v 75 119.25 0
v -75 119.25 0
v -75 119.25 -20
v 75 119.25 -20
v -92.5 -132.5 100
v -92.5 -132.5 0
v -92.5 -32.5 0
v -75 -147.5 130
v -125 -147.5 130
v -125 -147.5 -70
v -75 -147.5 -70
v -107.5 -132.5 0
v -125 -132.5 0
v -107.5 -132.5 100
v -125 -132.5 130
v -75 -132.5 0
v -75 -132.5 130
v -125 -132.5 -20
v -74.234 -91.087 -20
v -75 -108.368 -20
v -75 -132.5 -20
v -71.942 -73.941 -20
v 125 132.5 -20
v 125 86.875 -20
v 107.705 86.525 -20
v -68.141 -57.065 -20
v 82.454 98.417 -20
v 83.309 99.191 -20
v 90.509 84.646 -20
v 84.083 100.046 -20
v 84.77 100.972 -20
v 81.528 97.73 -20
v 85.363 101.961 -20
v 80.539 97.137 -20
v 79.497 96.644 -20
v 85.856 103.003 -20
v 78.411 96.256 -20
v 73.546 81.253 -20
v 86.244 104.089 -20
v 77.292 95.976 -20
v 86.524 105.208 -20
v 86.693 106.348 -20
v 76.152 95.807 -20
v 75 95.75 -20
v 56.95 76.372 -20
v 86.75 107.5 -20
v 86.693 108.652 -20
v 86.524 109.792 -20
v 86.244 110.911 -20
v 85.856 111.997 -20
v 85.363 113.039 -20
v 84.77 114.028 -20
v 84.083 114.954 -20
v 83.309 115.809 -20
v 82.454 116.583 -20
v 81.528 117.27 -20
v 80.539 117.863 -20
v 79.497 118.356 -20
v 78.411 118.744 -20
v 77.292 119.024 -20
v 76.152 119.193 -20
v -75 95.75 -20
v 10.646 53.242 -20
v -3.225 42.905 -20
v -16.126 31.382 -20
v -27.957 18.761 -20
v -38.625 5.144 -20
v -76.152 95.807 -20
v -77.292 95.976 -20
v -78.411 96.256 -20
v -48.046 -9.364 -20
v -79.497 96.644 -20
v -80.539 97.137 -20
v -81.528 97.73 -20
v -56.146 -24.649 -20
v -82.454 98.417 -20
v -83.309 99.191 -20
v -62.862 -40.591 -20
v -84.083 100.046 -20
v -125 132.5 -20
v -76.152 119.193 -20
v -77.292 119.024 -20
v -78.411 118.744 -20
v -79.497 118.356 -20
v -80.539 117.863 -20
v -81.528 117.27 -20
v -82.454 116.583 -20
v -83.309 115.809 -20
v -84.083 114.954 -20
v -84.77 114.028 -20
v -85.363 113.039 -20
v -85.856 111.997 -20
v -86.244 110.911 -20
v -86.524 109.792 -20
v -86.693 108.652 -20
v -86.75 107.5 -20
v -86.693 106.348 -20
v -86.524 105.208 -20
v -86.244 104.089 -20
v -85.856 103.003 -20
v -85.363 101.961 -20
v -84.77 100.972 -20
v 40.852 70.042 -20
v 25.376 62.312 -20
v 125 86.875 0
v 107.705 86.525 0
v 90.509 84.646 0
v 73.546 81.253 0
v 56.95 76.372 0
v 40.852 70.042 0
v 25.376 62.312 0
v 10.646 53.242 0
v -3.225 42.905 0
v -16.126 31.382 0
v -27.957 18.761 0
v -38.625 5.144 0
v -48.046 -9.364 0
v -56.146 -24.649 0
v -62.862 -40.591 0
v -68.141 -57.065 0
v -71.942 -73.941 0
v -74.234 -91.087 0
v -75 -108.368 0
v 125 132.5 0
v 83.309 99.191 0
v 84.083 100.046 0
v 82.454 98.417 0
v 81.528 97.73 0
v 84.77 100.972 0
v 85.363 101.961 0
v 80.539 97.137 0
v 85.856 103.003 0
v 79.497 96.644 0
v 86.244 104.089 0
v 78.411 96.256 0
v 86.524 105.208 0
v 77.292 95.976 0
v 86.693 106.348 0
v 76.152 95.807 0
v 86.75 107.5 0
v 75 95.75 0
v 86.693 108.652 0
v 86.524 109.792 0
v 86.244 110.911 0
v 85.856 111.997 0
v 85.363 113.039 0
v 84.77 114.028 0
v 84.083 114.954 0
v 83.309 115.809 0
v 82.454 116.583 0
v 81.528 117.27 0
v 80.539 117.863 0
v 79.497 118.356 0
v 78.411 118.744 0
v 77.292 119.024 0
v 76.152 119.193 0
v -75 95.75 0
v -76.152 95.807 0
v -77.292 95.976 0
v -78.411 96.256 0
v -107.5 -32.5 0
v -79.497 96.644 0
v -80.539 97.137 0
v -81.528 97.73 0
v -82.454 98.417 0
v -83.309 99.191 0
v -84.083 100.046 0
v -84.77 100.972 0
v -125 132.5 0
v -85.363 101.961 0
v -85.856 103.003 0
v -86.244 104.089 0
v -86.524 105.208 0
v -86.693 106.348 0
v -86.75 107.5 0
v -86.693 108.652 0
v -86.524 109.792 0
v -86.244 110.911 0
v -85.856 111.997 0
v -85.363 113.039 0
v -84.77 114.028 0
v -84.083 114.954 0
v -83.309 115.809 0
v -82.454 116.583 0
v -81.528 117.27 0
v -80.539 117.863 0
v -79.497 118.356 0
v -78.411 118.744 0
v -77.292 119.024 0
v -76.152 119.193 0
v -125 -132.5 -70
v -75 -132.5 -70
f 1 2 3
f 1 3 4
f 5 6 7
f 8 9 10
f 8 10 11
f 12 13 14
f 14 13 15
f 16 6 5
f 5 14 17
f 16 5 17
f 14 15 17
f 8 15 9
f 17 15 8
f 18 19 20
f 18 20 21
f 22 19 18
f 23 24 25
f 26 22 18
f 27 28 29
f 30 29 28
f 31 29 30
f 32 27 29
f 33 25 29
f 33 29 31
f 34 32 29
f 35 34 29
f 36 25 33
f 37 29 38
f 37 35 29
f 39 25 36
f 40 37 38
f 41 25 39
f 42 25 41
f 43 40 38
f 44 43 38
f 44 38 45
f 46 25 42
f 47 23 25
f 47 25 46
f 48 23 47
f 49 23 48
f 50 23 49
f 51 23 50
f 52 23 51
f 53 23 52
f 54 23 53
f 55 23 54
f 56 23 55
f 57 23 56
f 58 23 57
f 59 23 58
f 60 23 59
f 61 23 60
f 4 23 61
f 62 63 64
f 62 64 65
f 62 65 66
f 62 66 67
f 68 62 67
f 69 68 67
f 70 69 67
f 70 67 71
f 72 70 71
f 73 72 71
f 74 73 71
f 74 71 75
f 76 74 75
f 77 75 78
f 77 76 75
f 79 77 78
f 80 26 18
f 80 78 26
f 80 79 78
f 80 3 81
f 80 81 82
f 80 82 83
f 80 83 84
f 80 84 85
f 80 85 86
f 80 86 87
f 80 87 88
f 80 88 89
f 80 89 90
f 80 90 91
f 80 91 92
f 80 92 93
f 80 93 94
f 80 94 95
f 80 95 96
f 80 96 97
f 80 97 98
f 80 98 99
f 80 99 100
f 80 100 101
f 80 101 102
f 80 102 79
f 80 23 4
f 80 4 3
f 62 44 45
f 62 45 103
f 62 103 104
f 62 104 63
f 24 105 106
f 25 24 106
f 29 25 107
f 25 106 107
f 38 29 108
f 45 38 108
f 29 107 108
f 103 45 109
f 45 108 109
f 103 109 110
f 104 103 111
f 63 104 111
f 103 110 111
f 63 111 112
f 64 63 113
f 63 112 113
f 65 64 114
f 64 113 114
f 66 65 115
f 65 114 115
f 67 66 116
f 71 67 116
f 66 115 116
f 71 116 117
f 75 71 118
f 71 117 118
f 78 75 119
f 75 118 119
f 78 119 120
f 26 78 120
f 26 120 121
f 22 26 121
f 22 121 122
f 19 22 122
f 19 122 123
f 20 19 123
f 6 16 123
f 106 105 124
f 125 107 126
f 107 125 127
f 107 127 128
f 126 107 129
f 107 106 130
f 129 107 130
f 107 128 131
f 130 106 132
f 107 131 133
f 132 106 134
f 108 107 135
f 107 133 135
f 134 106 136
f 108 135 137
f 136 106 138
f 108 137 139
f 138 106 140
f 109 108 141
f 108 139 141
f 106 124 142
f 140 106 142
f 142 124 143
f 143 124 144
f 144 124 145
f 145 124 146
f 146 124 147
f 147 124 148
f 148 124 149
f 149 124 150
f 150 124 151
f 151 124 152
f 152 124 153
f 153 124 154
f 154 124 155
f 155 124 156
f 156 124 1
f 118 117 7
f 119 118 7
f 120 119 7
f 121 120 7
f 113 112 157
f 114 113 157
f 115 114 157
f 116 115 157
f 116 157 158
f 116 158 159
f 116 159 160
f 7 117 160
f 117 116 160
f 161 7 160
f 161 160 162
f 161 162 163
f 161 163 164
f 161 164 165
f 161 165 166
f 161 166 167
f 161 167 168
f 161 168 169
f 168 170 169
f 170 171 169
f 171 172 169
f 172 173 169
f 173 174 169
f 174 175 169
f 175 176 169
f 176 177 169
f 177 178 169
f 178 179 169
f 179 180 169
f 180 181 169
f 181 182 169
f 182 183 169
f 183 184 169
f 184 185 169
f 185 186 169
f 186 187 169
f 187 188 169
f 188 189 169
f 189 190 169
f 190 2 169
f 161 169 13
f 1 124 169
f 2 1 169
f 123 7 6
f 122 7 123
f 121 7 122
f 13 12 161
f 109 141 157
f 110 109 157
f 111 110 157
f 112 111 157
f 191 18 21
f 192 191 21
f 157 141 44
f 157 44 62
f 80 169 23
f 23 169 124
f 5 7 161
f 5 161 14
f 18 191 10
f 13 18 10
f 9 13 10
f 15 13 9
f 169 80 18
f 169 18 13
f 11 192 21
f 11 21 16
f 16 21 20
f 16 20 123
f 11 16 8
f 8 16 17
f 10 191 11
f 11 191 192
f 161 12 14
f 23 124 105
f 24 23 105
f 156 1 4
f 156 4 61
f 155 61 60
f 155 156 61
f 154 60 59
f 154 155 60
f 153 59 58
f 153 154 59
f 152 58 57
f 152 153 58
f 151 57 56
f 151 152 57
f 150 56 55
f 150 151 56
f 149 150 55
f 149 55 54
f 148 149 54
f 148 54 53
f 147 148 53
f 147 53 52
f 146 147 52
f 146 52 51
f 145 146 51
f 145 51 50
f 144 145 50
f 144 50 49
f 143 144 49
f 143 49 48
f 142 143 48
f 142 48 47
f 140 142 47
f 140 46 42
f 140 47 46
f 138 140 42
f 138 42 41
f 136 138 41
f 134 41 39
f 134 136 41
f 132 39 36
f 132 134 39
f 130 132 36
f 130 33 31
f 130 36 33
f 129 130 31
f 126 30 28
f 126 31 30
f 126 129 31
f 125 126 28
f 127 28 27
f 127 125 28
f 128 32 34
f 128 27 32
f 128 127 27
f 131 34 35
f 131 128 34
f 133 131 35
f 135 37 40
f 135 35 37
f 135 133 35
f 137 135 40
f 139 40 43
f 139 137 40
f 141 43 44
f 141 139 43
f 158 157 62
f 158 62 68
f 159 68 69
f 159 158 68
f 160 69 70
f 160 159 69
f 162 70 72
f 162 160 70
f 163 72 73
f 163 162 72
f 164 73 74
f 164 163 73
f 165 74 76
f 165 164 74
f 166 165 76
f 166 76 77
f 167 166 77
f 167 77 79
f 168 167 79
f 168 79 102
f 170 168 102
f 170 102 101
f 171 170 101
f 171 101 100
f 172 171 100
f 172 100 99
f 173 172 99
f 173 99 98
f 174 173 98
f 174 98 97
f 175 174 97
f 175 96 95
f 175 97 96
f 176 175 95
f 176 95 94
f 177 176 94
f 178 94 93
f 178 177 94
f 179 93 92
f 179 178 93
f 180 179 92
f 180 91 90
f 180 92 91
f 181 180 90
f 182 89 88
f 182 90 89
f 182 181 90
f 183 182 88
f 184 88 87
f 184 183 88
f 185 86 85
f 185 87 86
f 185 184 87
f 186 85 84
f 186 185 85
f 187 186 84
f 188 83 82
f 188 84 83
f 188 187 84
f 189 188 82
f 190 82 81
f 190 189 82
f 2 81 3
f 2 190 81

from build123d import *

# Parameters (mm, degrees)
BOSS_EXTRUDE1_DEPTH = 20
CUT_EXTRUDE1_DEPTH  = 80
SKETCH3_W           = 15
SKETCH3_H           = 100
BOSS_EXTRUDE2_DEPTH = 100
SKETCH10_W          = 50
SKETCH10_H          = 200
BOSS_EXTRUDE4_DEPTH = 15
CUT_EXTRUDE3_DEPTH  = 166


with BuildPart() as part:
    # Sketch1 → Boss-Extrude1 (new body)
    with BuildSketch(Plane.XY):
        with BuildLine():
            Line((-75, -132.5), (-125, -132.5))
            Line((-125, -132.5), (-125, 132.5))
            Line((-125, 132.5), (125, 132.5))
            Line((125, 132.5), (125, 86.875222581))
            ThreePointArc((125, 86.875222581), (-16.12613386, 31.381561178), (-75, -108.368215209))
            Line((-75, -108.368215209), (-75, -132.5))
        make_face()
    extrude(amount=-BOSS_EXTRUDE1_DEPTH)

    # Sketch2 → Cut-Extrude1 (cut)
    with BuildSketch(Plane.XY):
        with BuildLine():
            Line((-75, 119.25), (75, 119.25))
            ThreePointArc((75, 119.25), (86.75, 107.5), (75, 95.75))
            Line((75, 95.75), (-75, 95.75))
            ThreePointArc((-75, 95.75), (-86.75, 107.5), (-75, 119.25))
        make_face()
    extrude(amount=-CUT_EXTRUDE1_DEPTH, mode=Mode.SUBTRACT)

    # Sketch3 → Boss-Extrude2 (add)
    with BuildSketch(Plane.XY):
        with Locations((-100, -82.5)):
            Rectangle(SKETCH3_W, SKETCH3_H)
    extrude(amount=BOSS_EXTRUDE2_DEPTH)

    # Sketch10 → Boss-Extrude4 (add)
    with BuildSketch(Plane.XZ.offset(132.5)):
        with Locations((-100, 30)):
            Rectangle(SKETCH10_W, SKETCH10_H)
    extrude(amount=BOSS_EXTRUDE4_DEPTH)

    # Sketch11 → Cut-Extrude3 (cut)
    with BuildSketch(Plane(origin=(-92.5, 0, 0), x_dir=(0, 0, -1), z_dir=(1, 0, 0))):
        Polygon((0, -32.5), (-100, -132.5), (-100, -32.5), align=None)
    extrude(amount=-CUT_EXTRUDE3_DEPTH, mode=Mode.SUBTRACT)


solid = part.part
